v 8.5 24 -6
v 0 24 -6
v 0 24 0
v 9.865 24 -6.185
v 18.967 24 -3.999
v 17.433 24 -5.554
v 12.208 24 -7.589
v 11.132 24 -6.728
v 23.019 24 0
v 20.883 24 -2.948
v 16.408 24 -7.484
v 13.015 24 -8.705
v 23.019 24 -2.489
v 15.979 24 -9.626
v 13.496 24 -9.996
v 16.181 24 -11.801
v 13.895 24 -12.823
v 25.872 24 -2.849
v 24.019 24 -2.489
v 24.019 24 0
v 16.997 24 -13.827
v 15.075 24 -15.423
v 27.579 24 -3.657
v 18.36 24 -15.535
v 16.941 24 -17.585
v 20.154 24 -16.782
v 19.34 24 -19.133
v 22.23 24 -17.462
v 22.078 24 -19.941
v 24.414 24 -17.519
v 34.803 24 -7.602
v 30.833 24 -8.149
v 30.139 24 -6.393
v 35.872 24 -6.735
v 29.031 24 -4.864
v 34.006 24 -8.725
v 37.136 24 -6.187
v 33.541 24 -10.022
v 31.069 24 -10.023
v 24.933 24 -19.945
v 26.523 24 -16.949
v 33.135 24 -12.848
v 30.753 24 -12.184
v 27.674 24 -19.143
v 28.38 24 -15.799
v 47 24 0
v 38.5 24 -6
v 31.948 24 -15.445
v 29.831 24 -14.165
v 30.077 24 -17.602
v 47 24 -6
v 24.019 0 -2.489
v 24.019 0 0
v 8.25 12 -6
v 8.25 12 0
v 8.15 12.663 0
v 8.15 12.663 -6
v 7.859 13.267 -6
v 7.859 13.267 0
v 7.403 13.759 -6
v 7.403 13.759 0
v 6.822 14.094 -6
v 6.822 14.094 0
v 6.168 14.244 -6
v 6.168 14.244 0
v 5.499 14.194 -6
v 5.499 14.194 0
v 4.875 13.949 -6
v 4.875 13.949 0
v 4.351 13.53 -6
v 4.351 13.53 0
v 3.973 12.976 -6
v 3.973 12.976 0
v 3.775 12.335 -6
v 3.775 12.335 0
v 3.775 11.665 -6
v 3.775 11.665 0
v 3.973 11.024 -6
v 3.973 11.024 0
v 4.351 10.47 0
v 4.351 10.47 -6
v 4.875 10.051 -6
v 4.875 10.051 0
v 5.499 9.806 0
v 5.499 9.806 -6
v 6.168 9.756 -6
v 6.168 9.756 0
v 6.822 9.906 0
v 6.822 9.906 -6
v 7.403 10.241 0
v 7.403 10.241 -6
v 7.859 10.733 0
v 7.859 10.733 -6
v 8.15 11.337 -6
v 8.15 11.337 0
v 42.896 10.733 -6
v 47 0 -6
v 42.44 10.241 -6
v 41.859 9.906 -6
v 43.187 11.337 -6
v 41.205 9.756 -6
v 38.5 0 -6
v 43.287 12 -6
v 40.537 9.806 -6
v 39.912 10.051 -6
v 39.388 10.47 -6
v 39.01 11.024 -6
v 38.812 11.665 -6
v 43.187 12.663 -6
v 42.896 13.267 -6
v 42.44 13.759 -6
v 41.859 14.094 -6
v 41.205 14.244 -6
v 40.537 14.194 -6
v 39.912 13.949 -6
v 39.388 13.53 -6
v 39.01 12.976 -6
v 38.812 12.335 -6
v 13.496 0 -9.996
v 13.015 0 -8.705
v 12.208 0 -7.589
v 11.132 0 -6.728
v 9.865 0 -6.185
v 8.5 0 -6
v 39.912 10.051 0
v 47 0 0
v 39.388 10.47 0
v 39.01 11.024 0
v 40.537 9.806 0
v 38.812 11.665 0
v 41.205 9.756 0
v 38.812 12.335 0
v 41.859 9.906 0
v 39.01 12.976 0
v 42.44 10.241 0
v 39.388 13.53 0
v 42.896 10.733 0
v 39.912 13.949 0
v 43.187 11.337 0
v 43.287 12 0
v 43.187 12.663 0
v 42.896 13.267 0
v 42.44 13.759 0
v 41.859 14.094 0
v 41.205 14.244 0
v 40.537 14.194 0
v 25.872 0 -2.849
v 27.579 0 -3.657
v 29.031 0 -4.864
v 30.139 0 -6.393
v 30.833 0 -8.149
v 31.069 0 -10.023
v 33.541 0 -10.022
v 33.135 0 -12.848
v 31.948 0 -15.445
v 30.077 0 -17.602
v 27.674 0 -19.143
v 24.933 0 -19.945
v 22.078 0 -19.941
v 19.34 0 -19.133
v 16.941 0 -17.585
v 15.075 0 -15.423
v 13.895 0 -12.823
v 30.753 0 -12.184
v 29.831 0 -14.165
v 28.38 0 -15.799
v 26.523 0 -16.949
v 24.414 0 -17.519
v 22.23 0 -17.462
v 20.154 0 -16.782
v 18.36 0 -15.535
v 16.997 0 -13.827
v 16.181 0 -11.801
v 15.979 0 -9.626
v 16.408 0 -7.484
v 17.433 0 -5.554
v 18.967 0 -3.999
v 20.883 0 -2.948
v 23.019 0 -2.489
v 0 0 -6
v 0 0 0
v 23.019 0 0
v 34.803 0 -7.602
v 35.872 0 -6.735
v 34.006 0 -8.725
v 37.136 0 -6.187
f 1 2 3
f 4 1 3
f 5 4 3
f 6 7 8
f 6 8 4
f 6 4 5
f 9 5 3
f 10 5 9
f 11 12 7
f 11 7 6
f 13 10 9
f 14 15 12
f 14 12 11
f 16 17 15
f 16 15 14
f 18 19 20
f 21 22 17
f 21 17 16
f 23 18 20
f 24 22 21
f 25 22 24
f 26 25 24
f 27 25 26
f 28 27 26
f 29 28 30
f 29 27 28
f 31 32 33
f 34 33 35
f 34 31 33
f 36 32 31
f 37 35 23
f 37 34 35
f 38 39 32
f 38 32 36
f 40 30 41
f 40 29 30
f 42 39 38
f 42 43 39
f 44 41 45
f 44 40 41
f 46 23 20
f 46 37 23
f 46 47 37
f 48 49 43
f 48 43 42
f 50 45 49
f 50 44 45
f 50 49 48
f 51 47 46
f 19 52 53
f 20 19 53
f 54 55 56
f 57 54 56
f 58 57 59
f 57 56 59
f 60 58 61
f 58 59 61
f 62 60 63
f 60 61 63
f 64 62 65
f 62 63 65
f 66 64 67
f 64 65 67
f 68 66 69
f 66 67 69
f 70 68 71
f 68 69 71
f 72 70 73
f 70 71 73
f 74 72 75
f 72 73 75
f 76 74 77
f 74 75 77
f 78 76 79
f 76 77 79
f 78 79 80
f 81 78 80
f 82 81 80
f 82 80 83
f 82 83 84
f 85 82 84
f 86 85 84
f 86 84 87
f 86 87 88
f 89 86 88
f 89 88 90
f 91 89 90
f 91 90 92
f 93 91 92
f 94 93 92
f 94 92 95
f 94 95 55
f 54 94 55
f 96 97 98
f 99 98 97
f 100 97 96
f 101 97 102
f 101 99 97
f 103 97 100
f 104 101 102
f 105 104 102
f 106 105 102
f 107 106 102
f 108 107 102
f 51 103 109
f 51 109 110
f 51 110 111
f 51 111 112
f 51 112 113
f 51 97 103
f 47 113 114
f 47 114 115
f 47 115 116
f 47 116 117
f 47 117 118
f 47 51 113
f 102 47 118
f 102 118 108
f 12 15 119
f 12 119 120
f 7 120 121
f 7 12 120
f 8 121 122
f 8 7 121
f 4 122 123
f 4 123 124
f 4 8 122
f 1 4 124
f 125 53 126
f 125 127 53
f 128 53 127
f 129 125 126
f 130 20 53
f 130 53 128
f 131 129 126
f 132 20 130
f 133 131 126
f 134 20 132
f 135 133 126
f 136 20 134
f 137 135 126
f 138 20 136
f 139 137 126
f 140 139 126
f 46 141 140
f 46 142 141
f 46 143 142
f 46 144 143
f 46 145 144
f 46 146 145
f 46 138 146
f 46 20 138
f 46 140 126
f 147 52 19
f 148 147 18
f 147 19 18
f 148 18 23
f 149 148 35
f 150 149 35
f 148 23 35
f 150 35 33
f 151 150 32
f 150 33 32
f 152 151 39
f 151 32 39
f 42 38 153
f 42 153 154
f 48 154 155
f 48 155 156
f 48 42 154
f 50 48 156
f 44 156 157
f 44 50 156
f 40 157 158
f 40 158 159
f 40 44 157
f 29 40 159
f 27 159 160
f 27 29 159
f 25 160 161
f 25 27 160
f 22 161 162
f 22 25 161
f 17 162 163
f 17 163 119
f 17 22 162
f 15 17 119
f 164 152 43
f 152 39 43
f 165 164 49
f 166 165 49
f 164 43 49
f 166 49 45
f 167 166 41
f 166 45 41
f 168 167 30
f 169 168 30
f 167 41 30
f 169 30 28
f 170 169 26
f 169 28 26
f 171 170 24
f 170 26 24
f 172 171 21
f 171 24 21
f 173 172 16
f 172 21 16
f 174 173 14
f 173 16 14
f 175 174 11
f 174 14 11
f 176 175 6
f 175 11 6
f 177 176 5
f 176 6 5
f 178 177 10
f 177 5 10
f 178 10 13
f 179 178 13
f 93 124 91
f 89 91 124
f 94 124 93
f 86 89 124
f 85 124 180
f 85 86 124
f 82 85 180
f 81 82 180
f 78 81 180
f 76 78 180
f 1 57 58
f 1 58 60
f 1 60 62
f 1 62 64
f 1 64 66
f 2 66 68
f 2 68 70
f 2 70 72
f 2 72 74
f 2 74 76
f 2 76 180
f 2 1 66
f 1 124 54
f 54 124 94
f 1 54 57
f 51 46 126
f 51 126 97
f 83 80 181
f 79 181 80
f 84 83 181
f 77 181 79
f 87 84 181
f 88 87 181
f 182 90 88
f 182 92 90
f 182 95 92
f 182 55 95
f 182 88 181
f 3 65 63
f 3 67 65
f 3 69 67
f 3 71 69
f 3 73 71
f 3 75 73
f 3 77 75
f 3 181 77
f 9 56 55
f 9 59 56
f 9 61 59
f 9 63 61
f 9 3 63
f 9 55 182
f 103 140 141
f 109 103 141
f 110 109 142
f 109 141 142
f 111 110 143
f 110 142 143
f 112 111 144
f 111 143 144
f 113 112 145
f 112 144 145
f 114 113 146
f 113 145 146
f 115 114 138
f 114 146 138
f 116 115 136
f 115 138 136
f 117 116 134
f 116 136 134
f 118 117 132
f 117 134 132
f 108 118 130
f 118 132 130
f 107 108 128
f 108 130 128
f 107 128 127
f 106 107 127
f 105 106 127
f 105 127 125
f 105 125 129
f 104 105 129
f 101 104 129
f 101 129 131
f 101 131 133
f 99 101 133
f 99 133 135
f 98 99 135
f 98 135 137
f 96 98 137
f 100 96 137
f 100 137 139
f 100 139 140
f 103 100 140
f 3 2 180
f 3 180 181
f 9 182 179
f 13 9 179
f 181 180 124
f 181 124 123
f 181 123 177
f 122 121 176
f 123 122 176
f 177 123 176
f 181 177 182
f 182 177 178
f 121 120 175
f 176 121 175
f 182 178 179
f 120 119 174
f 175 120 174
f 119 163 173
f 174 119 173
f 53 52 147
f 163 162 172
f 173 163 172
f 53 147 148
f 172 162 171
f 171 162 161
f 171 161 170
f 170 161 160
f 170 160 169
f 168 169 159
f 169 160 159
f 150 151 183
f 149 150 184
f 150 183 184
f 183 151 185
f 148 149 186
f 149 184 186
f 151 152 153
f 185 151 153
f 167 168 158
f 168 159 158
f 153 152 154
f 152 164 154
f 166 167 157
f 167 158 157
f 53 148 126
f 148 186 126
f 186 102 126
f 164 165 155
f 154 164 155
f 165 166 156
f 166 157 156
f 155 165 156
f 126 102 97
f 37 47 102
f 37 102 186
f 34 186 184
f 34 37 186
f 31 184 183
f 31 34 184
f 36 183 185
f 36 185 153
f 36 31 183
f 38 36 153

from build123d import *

# Parameters (mm, degrees)
BOSS_EXTRUDE1_DEPTH            = 24
CUT_EXTRUDE1_DEPTH             = 25
SKETCH3_W                      = 7.55
SKETCH3_H                      = 24
F_4_5_4_5_DIAMETER_HOLE1_D     = 4.5
F_4_5_4_5_DIAMETER_HOLE1_DEPTH = 6


with BuildPart() as part:
    # Sketch1 → Boss-Extrude1 (new body)
    with BuildSketch(Plane(origin=(0, 24, 0), x_dir=(1, 0, 0), z_dir=(0, 1, 0))):
        with BuildLine():
            Line((0, 0), (47, 0))
            Line((47, 0), (47, 6))
            Line((47, 6), (38.5, 6))
            ThreePointArc((38.5, 6), (35.307693119, 7.131854655), (33.541354656, 10.021831577))
            ThreePointArc((33.541354656, 10.021831577), (23.505747016, 20.045434485), (13.49594739, 9.996059012))
            ThreePointArc((13.49594739, 9.996059012), (11.698748894, 7.121907302), (8.5, 6))
            Line((8.5, 6), (0, 6))
            Line((0, 6), (0, 0))
        make_face()
    extrude(amount=-BOSS_EXTRUDE1_DEPTH)

    # Sketch2 → Cut-Extrude1 (cut, through all)
    with BuildSketch(Plane.XZ):
        with BuildLine():
            Line((24.018633311, 0), (23.018633311, 0))
            Line((23.018633311, 0), (23.018633311, -2.489295869))
            ThreePointArc((23.018633311, -2.489295869), (23.518633311, -2.472721384), (24.018633311, -2.489295869))
            Line((24.018633311, -2.489295869), (24.018633311, 0))
        make_face()
    extrude(amount=-CUT_EXTRUDE1_DEPTH, mode=Mode.SUBTRACT)

    # Sketch3 → Cut-Revolve1 (revolve, cut)
    with BuildSketch(Plane(origin=(0, 0, -10.022721384), x_dir=(-1, 0, 0), z_dir=(0, 0, -1))):
        with Locations((-27.293633311, 12)):
            Rectangle(SKETCH3_W, SKETCH3_H)
    revolve(axis=Axis((23.518633311, 0, -10.022721384), (0, 1, 0)), mode=Mode.SUBTRACT)

    # Ø4.5 (4.5) Diameter Hole1
    with Locations(Plane(origin=(0, 0, -6), x_dir=(-1, 0, 0), z_dir=(0, 0, -1))):
        with Locations((-41.037266621, 12), (-6, 12)):
            Hole(F_4_5_4_5_DIAMETER_HOLE1_D / 2, depth=F_4_5_4_5_DIAMETER_HOLE1_DEPTH)


solid = part.part
